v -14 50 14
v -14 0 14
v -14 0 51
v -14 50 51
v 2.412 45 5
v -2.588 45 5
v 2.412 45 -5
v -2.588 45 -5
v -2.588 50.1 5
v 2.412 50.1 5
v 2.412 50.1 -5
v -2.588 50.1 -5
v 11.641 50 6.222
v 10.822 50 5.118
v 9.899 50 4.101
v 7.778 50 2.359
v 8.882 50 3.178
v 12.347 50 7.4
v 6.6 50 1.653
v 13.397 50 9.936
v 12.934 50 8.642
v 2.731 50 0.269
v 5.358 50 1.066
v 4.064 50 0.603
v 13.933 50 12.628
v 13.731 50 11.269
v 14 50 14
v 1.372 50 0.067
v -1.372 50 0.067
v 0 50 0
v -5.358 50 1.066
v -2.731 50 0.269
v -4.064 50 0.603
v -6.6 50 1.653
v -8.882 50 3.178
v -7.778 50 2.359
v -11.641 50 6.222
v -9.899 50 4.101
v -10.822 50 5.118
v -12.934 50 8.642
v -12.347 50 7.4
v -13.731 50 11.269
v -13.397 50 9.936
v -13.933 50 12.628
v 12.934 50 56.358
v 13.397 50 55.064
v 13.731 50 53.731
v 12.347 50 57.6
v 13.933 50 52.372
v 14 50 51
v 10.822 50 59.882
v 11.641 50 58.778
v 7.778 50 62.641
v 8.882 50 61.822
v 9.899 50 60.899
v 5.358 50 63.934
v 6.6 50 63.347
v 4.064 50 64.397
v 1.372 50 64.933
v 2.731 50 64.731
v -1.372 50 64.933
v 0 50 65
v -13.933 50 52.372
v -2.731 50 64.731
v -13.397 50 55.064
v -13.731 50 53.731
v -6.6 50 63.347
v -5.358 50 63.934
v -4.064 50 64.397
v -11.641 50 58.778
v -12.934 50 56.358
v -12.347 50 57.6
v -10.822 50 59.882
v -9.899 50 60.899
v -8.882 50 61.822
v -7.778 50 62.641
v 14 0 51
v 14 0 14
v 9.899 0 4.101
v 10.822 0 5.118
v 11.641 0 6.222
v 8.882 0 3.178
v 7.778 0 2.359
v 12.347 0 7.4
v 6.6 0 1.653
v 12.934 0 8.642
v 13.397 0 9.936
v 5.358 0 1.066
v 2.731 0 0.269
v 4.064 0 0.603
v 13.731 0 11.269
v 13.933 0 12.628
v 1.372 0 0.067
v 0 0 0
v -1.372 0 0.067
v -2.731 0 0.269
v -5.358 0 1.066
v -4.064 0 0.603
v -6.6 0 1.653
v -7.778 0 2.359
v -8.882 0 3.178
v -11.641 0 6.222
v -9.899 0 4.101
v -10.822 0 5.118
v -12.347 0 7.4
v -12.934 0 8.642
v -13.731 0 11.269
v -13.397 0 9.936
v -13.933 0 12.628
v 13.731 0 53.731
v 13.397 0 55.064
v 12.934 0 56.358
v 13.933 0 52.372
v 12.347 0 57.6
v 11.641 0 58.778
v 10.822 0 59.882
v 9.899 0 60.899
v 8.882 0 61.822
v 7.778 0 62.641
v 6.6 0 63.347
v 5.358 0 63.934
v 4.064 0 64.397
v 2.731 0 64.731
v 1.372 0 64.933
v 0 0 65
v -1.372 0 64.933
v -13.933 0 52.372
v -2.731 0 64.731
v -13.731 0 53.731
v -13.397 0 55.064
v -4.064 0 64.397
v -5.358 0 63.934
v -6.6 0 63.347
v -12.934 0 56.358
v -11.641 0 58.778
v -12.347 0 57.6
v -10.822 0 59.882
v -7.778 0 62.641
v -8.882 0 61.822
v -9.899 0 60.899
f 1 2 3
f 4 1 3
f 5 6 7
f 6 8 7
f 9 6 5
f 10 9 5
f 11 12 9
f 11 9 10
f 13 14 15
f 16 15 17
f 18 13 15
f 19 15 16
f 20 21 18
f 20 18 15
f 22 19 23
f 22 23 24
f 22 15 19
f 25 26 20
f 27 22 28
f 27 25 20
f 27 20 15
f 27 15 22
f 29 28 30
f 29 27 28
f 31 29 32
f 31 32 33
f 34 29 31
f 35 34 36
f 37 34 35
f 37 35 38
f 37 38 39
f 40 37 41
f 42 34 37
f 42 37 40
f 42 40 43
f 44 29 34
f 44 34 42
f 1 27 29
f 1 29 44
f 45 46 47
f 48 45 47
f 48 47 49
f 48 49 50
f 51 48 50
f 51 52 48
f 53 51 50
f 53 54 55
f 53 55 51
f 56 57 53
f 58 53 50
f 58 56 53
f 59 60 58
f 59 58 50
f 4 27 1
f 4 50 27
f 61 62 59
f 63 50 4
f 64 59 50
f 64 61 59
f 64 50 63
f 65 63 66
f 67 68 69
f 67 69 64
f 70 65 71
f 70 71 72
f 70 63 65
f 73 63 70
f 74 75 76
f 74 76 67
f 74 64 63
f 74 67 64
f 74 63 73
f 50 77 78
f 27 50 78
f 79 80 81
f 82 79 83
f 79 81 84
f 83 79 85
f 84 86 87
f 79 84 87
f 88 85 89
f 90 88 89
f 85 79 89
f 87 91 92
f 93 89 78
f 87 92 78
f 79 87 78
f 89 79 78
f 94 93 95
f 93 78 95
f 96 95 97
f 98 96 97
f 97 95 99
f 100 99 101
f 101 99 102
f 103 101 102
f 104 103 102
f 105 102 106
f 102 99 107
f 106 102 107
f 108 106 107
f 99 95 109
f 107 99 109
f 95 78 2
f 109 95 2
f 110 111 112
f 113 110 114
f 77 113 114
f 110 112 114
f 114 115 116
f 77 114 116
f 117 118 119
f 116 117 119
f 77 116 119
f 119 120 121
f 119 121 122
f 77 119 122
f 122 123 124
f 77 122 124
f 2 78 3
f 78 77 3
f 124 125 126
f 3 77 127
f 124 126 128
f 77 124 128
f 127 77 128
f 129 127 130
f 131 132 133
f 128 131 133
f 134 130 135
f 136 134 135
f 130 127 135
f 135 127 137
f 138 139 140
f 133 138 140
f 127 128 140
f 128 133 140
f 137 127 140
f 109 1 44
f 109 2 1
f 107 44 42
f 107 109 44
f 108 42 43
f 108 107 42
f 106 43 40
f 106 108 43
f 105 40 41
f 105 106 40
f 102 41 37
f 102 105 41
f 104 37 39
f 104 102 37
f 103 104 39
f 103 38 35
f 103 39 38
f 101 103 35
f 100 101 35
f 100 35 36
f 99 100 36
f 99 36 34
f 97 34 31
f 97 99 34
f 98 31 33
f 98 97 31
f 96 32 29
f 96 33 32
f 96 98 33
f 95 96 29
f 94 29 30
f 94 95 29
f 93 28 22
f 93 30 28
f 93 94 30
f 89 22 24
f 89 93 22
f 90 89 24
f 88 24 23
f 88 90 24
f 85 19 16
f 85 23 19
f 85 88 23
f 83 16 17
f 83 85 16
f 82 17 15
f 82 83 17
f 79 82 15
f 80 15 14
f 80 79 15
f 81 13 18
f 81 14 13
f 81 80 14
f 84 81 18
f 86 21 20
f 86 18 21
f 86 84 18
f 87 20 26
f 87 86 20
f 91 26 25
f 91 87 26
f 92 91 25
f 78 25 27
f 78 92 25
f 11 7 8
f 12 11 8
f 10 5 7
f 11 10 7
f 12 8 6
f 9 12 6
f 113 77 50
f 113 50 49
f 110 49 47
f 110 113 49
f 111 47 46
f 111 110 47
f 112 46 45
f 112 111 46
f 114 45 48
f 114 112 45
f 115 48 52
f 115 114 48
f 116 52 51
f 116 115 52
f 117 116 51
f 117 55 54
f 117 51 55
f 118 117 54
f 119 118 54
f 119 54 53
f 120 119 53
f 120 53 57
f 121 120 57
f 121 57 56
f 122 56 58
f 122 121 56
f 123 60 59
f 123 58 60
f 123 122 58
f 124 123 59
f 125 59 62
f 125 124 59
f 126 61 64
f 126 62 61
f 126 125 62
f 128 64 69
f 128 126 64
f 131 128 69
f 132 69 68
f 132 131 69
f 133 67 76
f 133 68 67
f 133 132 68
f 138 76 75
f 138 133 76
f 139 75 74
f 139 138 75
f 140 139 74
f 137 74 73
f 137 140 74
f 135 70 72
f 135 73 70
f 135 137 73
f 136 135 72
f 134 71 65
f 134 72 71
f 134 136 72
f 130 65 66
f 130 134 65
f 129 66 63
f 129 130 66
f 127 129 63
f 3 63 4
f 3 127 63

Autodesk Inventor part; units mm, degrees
ref_plane "YZ Plane" through (0, 0, 0) normal (1, 0, 0) x (0, 1, 0)
ref_plane "XZ Plane" through (0, 0, 0) normal (0, 1, 0) x (-1, 0, 0)
ref_plane "XY Plane" through (0, 0, 0) normal (0, 0, 1) x (1, 0, 0)
sketch "Sketch1" plane through (0, 0, 0) normal (0, 1, 0) x (-1, 0, 0)
  line L0 (0, 65) -> (0, 0) construction
  line L1 (-14, 51) -> (-14, 14)
  line L2 (14, 14) -> (14, 51)
  arc A0 (14, 51) -> (-14, 51) centre (0, 51) ccw
  arc A1 (-14, 14) -> (14, 14) centre (0, 14) ccw
  point P0 (0, 32.5)
  dimension "d0" = 65
  dimension "d1" = 28
extrude "Extrusion1" add sketch "Sketch1" along normal blind 50
sketch "Sketch2" plane through (0, 50, 0) normal (0, 1, 0) x (1, 0, 0)
  line L0 (-2.5878, -5) -> (2.4122, -5)
  line L1 (2.4122, -5) -> (2.4122, 5)
  line L2 (2.4122, 5) -> (-2.5878, 5)
  line L3 (-2.5878, 5) -> (-2.5878, -5)
  point P0 (0, 0)
  dimension "d4" = 5
  dimension "d5" = 10
  dimension "d6" = 5
extrude "Extrusion2" add sketch "Sketch2" along normal blind 0.1 and the other way blind 5 separate body
properties part number "battery"
